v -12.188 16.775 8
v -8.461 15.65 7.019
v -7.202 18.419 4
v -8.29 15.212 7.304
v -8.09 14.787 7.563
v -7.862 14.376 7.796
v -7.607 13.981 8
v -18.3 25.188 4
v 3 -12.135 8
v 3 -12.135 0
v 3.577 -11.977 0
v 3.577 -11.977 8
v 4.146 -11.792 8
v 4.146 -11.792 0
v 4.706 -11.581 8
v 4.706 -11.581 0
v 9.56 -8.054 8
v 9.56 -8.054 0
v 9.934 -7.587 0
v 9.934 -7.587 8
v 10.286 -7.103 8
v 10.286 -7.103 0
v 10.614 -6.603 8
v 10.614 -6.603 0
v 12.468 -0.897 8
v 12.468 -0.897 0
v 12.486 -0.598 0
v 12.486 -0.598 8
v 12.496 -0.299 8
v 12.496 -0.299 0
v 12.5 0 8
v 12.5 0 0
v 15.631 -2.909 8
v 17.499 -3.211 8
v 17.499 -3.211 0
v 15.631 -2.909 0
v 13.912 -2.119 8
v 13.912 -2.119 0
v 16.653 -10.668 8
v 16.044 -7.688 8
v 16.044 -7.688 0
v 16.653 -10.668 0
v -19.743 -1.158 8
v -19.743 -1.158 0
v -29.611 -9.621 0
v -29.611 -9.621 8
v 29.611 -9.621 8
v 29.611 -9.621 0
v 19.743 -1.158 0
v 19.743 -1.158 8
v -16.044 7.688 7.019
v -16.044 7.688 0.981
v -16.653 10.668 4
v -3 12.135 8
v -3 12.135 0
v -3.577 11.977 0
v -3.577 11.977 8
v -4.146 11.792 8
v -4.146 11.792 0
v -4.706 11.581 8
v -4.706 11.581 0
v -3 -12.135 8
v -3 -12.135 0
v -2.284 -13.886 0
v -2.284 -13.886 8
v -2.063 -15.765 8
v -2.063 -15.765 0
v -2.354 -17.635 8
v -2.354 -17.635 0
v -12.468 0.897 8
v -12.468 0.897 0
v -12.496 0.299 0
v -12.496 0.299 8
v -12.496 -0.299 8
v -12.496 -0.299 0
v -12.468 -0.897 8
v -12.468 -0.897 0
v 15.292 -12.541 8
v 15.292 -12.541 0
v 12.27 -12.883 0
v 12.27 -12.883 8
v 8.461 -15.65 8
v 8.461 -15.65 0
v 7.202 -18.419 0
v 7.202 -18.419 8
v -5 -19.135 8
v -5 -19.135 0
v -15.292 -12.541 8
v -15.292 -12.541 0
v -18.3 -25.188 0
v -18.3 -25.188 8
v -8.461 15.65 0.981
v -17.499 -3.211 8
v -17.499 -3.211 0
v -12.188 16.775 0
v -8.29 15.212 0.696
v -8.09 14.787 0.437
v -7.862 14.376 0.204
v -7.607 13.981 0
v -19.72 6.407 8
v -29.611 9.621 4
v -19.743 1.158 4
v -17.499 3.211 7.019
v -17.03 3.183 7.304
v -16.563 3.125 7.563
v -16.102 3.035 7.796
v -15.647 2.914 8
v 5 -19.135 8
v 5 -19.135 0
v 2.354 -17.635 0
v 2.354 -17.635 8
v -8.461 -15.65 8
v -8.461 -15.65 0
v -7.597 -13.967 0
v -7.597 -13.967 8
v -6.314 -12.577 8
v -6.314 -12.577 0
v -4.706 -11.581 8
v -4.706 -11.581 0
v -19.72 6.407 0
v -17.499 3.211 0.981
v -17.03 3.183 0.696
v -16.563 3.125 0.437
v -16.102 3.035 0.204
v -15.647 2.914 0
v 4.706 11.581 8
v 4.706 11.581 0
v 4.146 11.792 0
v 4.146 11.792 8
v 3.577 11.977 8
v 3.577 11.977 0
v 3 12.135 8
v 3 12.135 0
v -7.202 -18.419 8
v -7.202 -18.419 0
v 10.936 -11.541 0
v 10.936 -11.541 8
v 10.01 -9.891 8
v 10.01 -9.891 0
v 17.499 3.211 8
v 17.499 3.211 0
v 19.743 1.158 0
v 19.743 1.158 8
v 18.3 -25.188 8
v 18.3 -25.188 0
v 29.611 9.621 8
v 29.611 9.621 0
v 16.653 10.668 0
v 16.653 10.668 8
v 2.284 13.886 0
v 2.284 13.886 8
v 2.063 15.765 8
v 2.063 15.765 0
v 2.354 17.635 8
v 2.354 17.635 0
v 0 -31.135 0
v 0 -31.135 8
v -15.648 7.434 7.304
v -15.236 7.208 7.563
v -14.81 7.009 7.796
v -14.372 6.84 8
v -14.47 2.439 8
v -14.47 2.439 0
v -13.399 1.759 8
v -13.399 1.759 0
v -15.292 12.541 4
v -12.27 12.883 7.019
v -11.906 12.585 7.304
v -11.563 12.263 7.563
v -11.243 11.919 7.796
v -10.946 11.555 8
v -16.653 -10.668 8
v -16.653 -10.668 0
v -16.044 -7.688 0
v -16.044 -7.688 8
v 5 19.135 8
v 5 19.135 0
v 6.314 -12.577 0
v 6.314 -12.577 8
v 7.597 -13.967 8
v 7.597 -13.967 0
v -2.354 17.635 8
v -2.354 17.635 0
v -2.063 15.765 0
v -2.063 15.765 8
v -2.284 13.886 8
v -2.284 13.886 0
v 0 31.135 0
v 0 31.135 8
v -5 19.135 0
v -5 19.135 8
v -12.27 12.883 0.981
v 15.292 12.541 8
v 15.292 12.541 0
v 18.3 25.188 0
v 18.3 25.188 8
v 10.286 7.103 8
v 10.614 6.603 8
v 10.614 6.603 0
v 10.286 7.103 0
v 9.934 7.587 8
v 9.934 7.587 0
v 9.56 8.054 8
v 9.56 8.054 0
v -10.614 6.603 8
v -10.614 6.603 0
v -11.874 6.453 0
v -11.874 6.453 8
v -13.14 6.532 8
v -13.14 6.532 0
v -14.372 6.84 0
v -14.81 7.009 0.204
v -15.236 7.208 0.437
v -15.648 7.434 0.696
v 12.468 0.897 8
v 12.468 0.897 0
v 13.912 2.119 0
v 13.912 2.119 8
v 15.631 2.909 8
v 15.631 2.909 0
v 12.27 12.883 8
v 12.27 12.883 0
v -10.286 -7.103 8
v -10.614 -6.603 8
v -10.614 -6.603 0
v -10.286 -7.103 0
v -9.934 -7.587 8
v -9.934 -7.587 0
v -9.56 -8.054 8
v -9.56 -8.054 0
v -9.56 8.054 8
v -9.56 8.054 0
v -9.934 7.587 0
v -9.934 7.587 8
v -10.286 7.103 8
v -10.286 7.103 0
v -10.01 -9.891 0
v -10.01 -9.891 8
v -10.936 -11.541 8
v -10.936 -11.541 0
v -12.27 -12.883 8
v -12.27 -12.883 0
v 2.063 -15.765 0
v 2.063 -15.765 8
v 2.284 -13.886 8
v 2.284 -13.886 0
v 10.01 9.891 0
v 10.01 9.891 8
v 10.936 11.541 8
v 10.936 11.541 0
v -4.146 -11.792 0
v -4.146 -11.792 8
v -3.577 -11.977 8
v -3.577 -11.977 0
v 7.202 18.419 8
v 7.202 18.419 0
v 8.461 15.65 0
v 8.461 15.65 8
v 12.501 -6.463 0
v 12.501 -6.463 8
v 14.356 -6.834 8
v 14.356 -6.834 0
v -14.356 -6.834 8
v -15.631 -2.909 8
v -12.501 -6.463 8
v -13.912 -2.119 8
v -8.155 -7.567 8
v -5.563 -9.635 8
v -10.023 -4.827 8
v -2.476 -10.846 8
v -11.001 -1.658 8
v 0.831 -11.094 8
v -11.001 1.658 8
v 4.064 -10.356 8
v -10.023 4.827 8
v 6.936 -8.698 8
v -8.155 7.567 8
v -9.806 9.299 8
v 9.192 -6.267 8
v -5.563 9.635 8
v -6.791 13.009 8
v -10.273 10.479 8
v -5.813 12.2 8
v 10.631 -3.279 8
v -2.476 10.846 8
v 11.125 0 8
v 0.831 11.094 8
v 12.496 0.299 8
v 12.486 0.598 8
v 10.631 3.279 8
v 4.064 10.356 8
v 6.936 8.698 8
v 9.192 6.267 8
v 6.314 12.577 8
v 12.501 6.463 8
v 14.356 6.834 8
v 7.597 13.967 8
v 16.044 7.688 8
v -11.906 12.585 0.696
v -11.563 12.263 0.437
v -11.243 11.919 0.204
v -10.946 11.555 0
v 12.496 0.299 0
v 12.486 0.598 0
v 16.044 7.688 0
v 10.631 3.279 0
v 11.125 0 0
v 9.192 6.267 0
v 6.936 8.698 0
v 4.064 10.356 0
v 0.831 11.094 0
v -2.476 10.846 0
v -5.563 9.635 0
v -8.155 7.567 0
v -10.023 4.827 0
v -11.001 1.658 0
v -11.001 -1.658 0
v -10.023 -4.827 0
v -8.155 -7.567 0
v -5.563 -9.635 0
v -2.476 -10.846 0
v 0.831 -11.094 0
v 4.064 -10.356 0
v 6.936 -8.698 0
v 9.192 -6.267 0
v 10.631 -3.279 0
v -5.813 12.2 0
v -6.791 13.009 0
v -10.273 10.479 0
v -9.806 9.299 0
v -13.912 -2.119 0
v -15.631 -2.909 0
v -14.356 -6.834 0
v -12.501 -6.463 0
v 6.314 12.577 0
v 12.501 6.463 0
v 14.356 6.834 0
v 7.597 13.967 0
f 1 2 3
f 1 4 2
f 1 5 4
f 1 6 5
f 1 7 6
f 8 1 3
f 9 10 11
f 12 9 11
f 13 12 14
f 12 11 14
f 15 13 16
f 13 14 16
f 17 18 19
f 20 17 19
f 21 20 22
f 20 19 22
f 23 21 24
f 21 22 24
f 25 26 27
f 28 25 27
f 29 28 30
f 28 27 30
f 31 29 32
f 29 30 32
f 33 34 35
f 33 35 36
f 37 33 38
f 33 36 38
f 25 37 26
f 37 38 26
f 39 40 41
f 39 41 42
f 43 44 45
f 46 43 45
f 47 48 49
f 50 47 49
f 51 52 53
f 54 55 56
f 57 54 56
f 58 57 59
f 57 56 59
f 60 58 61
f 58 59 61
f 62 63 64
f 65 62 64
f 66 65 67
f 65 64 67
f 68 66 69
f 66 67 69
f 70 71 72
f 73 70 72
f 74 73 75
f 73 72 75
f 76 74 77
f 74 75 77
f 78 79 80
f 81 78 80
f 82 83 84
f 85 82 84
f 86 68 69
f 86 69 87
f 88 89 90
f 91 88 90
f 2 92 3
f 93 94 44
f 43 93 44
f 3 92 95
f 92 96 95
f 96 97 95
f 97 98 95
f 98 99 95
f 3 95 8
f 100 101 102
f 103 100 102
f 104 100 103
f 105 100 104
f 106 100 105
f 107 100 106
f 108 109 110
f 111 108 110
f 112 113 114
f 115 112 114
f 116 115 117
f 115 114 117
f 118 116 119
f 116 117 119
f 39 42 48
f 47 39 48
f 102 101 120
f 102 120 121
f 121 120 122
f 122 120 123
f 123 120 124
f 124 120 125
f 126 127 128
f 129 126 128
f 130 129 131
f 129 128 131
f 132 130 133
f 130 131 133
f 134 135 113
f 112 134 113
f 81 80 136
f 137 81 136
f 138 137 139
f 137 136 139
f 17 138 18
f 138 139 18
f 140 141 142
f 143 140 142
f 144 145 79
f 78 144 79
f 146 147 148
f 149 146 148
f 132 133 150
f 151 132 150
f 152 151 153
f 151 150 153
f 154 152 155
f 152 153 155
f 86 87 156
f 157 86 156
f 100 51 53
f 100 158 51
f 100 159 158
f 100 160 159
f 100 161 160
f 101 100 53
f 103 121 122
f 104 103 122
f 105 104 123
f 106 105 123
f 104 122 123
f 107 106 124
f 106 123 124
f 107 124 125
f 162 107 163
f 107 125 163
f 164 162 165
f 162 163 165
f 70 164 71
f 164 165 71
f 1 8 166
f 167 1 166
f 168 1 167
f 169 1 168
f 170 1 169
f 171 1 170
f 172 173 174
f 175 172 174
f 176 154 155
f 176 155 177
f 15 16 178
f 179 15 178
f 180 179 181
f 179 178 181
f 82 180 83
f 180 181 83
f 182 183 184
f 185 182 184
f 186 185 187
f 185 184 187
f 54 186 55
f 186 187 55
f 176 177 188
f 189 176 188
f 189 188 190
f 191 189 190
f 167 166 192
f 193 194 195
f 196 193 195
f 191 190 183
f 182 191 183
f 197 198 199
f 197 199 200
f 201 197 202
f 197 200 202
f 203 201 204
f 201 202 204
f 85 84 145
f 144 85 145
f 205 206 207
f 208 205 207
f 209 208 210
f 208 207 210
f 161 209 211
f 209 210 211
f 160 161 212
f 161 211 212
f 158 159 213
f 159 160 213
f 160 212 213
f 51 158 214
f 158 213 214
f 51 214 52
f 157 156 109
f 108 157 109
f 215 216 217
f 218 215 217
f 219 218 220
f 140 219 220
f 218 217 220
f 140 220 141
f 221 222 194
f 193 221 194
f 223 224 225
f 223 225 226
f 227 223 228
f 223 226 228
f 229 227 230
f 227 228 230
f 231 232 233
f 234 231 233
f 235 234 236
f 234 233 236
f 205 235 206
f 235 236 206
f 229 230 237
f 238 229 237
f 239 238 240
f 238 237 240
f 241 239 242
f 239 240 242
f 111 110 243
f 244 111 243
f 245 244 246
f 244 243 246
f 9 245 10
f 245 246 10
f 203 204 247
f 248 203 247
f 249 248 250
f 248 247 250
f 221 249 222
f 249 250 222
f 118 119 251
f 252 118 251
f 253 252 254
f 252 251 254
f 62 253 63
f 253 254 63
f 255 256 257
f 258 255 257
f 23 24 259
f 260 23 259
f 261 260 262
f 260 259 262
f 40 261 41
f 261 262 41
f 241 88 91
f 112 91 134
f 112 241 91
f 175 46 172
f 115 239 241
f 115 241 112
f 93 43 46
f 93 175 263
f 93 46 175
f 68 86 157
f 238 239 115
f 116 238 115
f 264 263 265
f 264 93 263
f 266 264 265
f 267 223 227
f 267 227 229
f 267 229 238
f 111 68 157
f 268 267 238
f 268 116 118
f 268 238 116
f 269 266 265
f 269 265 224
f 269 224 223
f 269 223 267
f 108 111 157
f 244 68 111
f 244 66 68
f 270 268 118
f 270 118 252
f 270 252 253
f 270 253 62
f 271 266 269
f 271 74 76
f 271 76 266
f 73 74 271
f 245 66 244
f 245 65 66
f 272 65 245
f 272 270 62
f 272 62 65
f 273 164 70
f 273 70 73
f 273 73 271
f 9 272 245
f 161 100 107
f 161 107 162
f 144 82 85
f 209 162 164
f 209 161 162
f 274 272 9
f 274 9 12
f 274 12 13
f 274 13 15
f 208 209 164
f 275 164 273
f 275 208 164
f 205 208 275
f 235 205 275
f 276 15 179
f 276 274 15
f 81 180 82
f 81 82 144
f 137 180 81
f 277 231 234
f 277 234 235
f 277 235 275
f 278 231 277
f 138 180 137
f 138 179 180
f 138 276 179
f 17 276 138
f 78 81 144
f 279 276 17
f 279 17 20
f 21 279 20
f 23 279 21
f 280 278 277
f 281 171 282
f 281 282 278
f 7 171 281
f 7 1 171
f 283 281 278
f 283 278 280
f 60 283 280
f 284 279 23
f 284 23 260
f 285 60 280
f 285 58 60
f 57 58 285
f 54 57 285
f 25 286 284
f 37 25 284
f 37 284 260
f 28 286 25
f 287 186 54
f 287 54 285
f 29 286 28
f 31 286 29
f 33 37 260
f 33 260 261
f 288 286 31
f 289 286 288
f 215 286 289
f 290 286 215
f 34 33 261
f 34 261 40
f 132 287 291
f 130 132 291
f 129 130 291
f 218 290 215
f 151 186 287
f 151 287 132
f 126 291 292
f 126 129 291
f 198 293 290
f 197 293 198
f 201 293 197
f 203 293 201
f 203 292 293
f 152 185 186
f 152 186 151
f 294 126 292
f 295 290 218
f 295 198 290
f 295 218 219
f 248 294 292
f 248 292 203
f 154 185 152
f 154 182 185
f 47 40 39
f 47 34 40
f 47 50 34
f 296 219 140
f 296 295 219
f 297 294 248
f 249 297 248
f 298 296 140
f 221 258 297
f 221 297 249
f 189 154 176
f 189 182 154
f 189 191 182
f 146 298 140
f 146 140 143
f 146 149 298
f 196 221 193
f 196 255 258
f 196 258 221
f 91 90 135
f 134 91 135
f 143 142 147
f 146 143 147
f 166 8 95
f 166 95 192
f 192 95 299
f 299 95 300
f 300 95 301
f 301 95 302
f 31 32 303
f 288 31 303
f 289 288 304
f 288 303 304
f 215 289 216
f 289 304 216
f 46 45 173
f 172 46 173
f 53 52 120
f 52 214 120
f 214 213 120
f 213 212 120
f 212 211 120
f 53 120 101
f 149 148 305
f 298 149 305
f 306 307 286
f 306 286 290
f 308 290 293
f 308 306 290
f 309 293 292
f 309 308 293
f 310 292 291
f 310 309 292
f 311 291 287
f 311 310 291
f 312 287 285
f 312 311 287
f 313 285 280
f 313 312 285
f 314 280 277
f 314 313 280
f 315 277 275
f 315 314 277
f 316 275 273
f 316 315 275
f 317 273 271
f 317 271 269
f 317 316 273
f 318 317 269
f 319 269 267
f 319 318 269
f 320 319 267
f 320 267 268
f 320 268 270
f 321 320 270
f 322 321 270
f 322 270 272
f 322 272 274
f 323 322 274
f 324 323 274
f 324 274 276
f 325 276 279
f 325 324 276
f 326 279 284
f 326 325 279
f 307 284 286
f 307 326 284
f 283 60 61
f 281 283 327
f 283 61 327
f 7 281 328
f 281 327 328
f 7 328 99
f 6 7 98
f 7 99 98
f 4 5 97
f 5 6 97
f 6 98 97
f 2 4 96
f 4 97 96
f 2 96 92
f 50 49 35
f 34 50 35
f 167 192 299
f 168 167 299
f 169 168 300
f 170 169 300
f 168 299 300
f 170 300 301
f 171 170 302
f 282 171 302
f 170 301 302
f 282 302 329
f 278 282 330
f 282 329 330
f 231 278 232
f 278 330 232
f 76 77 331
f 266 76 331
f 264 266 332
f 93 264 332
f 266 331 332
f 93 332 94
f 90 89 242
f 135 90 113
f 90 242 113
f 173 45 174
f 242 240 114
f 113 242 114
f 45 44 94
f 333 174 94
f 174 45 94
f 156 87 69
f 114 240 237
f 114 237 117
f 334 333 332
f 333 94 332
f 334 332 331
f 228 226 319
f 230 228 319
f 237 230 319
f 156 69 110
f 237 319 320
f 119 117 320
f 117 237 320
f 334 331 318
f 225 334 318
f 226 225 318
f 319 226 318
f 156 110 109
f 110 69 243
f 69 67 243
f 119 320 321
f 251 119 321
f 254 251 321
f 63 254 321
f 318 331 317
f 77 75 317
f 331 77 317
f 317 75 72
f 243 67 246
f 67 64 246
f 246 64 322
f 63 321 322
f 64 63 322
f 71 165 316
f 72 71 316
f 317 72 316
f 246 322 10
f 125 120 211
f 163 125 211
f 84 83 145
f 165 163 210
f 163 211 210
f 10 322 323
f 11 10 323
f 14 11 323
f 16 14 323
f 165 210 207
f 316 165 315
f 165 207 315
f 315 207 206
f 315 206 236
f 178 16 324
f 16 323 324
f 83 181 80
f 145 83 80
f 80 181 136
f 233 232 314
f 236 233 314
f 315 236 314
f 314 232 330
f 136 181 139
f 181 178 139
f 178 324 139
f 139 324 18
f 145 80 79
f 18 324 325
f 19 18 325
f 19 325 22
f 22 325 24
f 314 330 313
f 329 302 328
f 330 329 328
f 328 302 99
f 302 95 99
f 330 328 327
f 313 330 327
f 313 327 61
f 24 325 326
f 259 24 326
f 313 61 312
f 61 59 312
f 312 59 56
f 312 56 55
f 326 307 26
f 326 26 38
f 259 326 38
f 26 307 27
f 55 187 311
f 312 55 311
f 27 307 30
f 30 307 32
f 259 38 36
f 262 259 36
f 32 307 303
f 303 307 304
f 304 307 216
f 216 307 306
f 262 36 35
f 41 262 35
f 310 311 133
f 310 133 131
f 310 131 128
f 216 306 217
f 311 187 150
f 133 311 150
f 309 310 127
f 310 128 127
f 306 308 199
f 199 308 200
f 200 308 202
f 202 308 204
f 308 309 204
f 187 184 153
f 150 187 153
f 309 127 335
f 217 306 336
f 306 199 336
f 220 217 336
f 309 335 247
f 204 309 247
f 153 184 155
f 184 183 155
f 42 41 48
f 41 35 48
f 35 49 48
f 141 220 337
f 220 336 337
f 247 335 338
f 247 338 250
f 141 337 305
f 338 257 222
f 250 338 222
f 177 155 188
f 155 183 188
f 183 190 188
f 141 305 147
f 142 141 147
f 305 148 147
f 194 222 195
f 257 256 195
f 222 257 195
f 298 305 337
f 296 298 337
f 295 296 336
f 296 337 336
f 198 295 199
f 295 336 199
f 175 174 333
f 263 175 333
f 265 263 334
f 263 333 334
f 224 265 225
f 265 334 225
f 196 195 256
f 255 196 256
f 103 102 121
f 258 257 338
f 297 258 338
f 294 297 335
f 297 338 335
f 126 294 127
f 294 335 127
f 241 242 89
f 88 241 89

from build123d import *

# Parameters (mm, degrees)
F0_R     = 11.125
F1_DEPTH = 8
F2_SIZE  = 3.99999


# Not quite as in the source:
# - a fillet or chamfer is up to 0.001 mm smaller than in the source, because OpenCascade refuses the exact size


with BuildPart() as f1:
    # F0 (on Top) → F1 (new body)
    with BuildSketch(Plane.XY):
        with BuildLine():
            ThreePointArc((12.4677994948, -0.8966469518), (12.4919472799, -0.44861248), (12.5, 0))
            ThreePointArc((12.5, 0), (12.4919472799, 0.44861248), (12.4677994948, 0.8966469518))
            ThreePointArc((12.4677994948, 0.8966469518), (11.8882064537, 3.8627124297), (10.6136975286, 6.6029860496))
            ThreePointArc((10.6136975286, 6.6029860496), (10.1127124297, 7.3473156537), (9.559625819, 8.0537912936))
            ThreePointArc((9.559625819, 8.0537912936), (7.3473156537, 10.1127124297), (4.7055238527, 11.5805028074))
            ThreePointArc((4.7055238527, 11.5805028074), (3.8627124297, 11.8882064537), (3, 12.1346610995))
            ThreePointArc((3, 12.1346610995), (0, 12.5), (-3, 12.1346610995))
            ThreePointArc((-3, 12.1346610995), (-3.8627124297, 11.8882064537), (-4.7055238527, 11.5805028074))
            ThreePointArc((-4.7055238527, 11.5805028074), (-7.3473156537, 10.1127124297), (-9.559625819, 8.0537912936))
            ThreePointArc((-9.559625819, 8.0537912936), (-10.1127124297, 7.3473156537), (-10.6136975286, 6.6029860496))
            ThreePointArc((-10.6136975286, 6.6029860496), (-11.8882064537, 3.8627124297), (-12.4677994948, 0.8966469518))
            ThreePointArc((-12.4677994948, 0.8966469518), (-12.5, 0), (-12.4677994948, -0.8966469518))
            ThreePointArc((-12.4677994948, -0.8966469518), (-11.8882064537, -3.8627124297), (-10.6136975286, -6.6029860496))
            ThreePointArc((-10.6136975286, -6.6029860496), (-10.1127124297, -7.3473156537), (-9.559625819, -8.0537912936))
            ThreePointArc((-9.559625819, -8.0537912936), (-7.3473156537, -10.1127124297), (-4.7055238527, -11.5805028074))
            ThreePointArc((-4.7055238527, -11.5805028074), (-3.8627124297, -11.8882064537), (-3, -12.1346610995))
            ThreePointArc((-3, -12.1346610995), (0, -12.5), (3, -12.1346610995))
            ThreePointArc((3, -12.1346610995), (3.8627124297, -11.8882064537), (4.7055238527, -11.5805028074))
            ThreePointArc((4.7055238527, -11.5805028074), (7.3473156537, -10.1127124297), (9.559625819, -8.0537912936))
            ThreePointArc((9.559625819, -8.0537912936), (10.1127124297, -7.3473156537), (10.6136975286, -6.6029860496))
            ThreePointArc((10.6136975286, -6.6029860496), (11.8882064537, -3.8627124297), (12.4677994948, -0.8966469518))
        make_face()
        Circle(F0_R, mode=Mode.SUBTRACT)
        with BuildLine():
            ThreePointArc((10.6136975286, 6.6029860496), (11.8882064537, 3.8627124297), (12.4677994948, 0.8966469518))
            ThreePointArc((12.4677994948, 0.8966469518), (14.7448297559, 2.5723295046), (17.4989772889, 3.2106477587))
            ThreePointArc((17.4989772889, 3.2106477587), (18.3165016402, 3.1827968502), (19.1251951089, 3.0597659125))
            Line((19.1251951089, 3.0597659125), (17.2710931427, 8.7661050102))
            ThreePointArc((17.2710931427, 8.7661050102), (16.689162154, 8.1912327962), (16.0441414138, 7.6881721809))
            ThreePointArc((16.0441414138, 7.6881721809), (13.4407951985, 6.5857351937), (10.6136975286, 6.6029860496))
        make_face()
        with BuildLine():
            ThreePointArc((17.4989772889, -3.2106477587), (14.7448297559, -2.5723295046), (12.4677994948, -0.8966469518))
            ThreePointArc((12.4677994948, -0.8966469518), (11.8882064537, -3.8627124297), (10.6136975286, -6.6029860496))
            ThreePointArc((10.6136975286, -6.6029860496), (13.4407951985, -6.5857351937), (16.0441414138, -7.6881721809))
            ThreePointArc((16.0441414138, -7.6881721809), (16.689162154, -8.1912327962), (17.2710931427, -8.7661050102))
            Line((17.2710931427, -8.7661050102), (19.1251951089, -3.0597659125))
            ThreePointArc((19.1251951089, -3.0597659125), (18.3165016402, -3.1827968502), (17.4989772889, -3.2106477587))
        make_face()
        with BuildLine():
            ThreePointArc((19.1251951089, 3.0597659125), (18.3165016402, 3.1827968502), (17.4989772889, 3.2106477587))
            Line((17.4989772889, 3.2106477587), (19.7432290977, 1.1576528799))
            Line((19.7432290977, 1.1576528799), (19.1251951089, 3.0597659125))
        make_face()
        with BuildLine():
            Line((19.7432290977, -1.1576528799), (17.4989772889, -3.2106477587))
            ThreePointArc((17.4989772889, -3.2106477587), (18.3165016402, -3.1827968502), (19.1251951089, -3.0597659125))
            Line((19.1251951089, -3.0597659125), (19.7432290977, -1.1576528799))
        make_face()
        with BuildLine():
            ThreePointArc((4.7055238527, 11.5805028074), (7.3473156537, 10.1127124297), (9.559625819, 8.0537912936))
            ThreePointArc((9.559625819, 8.0537912936), (10.4168405049, 10.7478517624), (12.269798608, 12.8831093804))
            ThreePointArc((12.269798608, 12.8831093804), (12.9475600548, 13.3411062792), (13.674122585, 13.7169102542))
            Line((13.674122585, 13.7169102542), (8.8200206188, 17.243621768))
            ThreePointArc((8.8200206188, 17.243621768), (8.6871299688, 16.4364899243), (8.4609888389, 15.6503716587))
            ThreePointArc((8.4609888389, 15.6503716587), (7.0028337111, 13.228272889), (4.7055238527, 11.5805028074))
        make_face()
        with BuildLine():
            Line((16.6530591539, 10.6682180428), (16.0441414138, 7.6881721809))
            ThreePointArc((16.0441414138, 7.6881721809), (16.689162154, 8.1912327962), (17.2710931427, 8.7661050102))
            Line((17.2710931427, 8.7661050102), (16.6530591539, 10.6682180428))
        make_face()
        Polygon((17.2710931427, 8.7661050102), (19.1251951089, 3.0597659125), (19.7432290977, 1.1576528799), (29.6108223213, 9.6211393939), (16.6530591539, 10.6682180428), align=None)
        with BuildLine():
            ThreePointArc((12.269798608, -12.8831093804), (10.4168405049, -10.7478517624), (9.559625819, -8.0537912936))
            ThreePointArc((9.559625819, -8.0537912936), (7.3473156537, -10.1127124297), (4.7055238527, -11.5805028074))
            ThreePointArc((4.7055238527, -11.5805028074), (7.0028337111, -13.228272889), (8.4609888389, -15.6503716587))
            ThreePointArc((8.4609888389, -15.6503716587), (8.6871299688, -16.4364899243), (8.8200206188, -17.243621768))
            Line((8.8200206188, -17.243621768), (13.674122585, -13.7169102542))
            ThreePointArc((13.674122585, -13.7169102542), (12.9475600548, -13.3411062792), (12.269798608, -12.8831093804))
        make_face()
        with BuildLine():
            ThreePointArc((17.2710931427, -8.7661050102), (16.689162154, -8.1912327962), (16.0441414138, -7.6881721809))
            Line((16.0441414138, -7.6881721809), (16.6530591539, -10.6682180428))
            Line((16.6530591539, -10.6682180428), (17.2710931427, -8.7661050102))
        make_face()
        Polygon((19.7432290977, -1.1576528799), (19.1251951089, -3.0597659125), (17.2710931427, -8.7661050102), (16.6530591539, -10.6682180428), (29.6108223213, -9.6211393939), align=None)
        with BuildLine():
            ThreePointArc((13.674122585, 13.7169102542), (12.9475600548, 13.3411062792), (12.269798608, 12.8831093804))
            Line((12.269798608, 12.8831093804), (15.2921565738, 12.5413397496))
            Line((15.2921565738, 12.5413397496), (13.674122585, 13.7169102542))
        make_face()
        with BuildLine():
            Line((15.2921565738, -12.5413397496), (12.269798608, -12.8831093804))
            ThreePointArc((12.269798608, -12.8831093804), (12.9475600548, -13.3411062792), (13.674122585, -13.7169102542))
            Line((13.674122585, -13.7169102542), (15.2921565738, -12.5413397496))
        make_face()
        with BuildLine():
            ThreePointArc((-3, 12.1346610995), (0, 12.5), (3, 12.1346610995))
            ThreePointArc((3, 12.1346610995), (2.1099722363, 14.818059953), (2.353973894, 17.6346610995))
            ThreePointArc((2.353973894, 17.6346610995), (2.6330905999, 18.403566557), (3, 19.1346610995))
            Line((3, 19.1346610995), (-3, 19.1346610995))
            ThreePointArc((-3, 19.1346610995), (-2.6330905999, 18.403566557), (-2.353973894, 17.6346610995))
            ThreePointArc((-2.353973894, 17.6346610995), (-2.1099722363, 14.818059953), (-3, 12.1346610995))
        make_face()
        with BuildLine():
            Line((7.20198663, 18.4191922726), (8.4609888389, 15.6503716587))
            ThreePointArc((8.4609888389, 15.6503716587), (8.6871299688, 16.4364899243), (8.8200206188, 17.243621768))
            Line((8.8200206188, 17.243621768), (7.20198663, 18.4191922726))
        make_face()
        Polygon((8.8200206188, 17.243621768), (13.674122585, 13.7169102542), (15.2921565738, 12.5413397496), (18.3004946294, 25.1884699436), (7.20198663, 18.4191922726), align=None)
        with BuildLine():
            ThreePointArc((2.353973894, -17.6346610995), (2.1099722363, -14.818059953), (3, -12.1346610995))
            ThreePointArc((3, -12.1346610995), (0, -12.5), (-3, -12.1346610995))
            ThreePointArc((-3, -12.1346610995), (-2.1099722363, -14.818059953), (-2.353973894, -17.6346610995))
            ThreePointArc((-2.353973894, -17.6346610995), (-2.6330905999, -18.403566557), (-3, -19.1346610995))
            Line((-3, -19.1346610995), (3, -19.1346610995))
            ThreePointArc((3, -19.1346610995), (2.6330905999, -18.403566557), (2.353973894, -17.6346610995))
        make_face()
        with BuildLine():
            ThreePointArc((8.8200206188, -17.243621768), (8.6871299688, -16.4364899243), (8.4609888389, -15.6503716587))
            Line((8.4609888389, -15.6503716587), (7.20198663, -18.4191922726))
            Line((7.20198663, -18.4191922726), (8.8200206188, -17.243621768))
        make_face()
        Polygon((15.2921565738, -12.5413397496), (13.674122585, -13.7169102542), (8.8200206188, -17.243621768), (7.20198663, -18.4191922726), (18.3004946294, -25.1884699436), align=None)
        with BuildLine():
            ThreePointArc((3, 19.1346610995), (2.6330905999, 18.403566557), (2.353973894, 17.6346610995))
            Line((2.353973894, 17.6346610995), (5, 19.1346610995))
            Line((5, 19.1346610995), (3, 19.1346610995))
        make_face()
        with BuildLine():
            Line((5, -19.1346610995), (2.353973894, -17.6346610995))
            ThreePointArc((2.353973894, -17.6346610995), (2.6330905999, -18.403566557), (3, -19.1346610995))
            Line((3, -19.1346610995), (5, -19.1346610995))
        make_face()
        with BuildLine():
            ThreePointArc((-9.559625819, 8.0537912936), (-7.3473156537, 10.1127124297), (-4.7055238527, 11.5805028074))
            ThreePointArc((-4.7055238527, 11.5805028074), (-7.0028337111, 13.228272889), (-8.4609888389, 15.6503716587))
            ThreePointArc((-8.4609888389, 15.6503716587), (-8.6871299688, 16.4364899243), (-8.8200206188, 17.243621768))
            Line((-8.8200206188, 17.243621768), (-13.674122585, 13.7169102542))
            ThreePointArc((-13.674122585, 13.7169102542), (-12.9475600548, 13.3411062792), (-12.269798608, 12.8831093804))
            ThreePointArc((-12.269798608, 12.8831093804), (-10.4168405049, 10.7478517624), (-9.559625819, 8.0537912936))
        make_face()
        with BuildLine():
            Line((-5, 19.1346610995), (-2.353973894, 17.6346610995))
            ThreePointArc((-2.353973894, 17.6346610995), (-2.6330905999, 18.403566557), (-3, 19.1346610995))
            Line((-3, 19.1346610995), (-5, 19.1346610995))
        make_face()
        Polygon((-3, 19.1346610995), (3, 19.1346610995), (5, 19.1346610995), (0, 31.1346610995), (-5, 19.1346610995), align=None)
        with BuildLine():
            ThreePointArc((-8.4609888389, -15.6503716587), (-7.0028337111, -13.228272889), (-4.7055238527, -11.5805028074))
            ThreePointArc((-4.7055238527, -11.5805028074), (-7.3473156537, -10.1127124297), (-9.559625819, -8.0537912936))
            ThreePointArc((-9.559625819, -8.0537912936), (-10.4168405049, -10.7478517624), (-12.269798608, -12.8831093804))
            ThreePointArc((-12.269798608, -12.8831093804), (-12.9475600548, -13.3411062792), (-13.674122585, -13.7169102542))
            Line((-13.674122585, -13.7169102542), (-8.8200206188, -17.243621768))
            ThreePointArc((-8.8200206188, -17.243621768), (-8.6871299688, -16.4364899243), (-8.4609888389, -15.6503716587))
        make_face()
        with BuildLine():
            ThreePointArc((-3, -19.1346610995), (-2.6330905999, -18.403566557), (-2.353973894, -17.6346610995))
            Line((-2.353973894, -17.6346610995), (-5, -19.1346610995))
            Line((-5, -19.1346610995), (-3, -19.1346610995))
        make_face()
        Polygon((5, -19.1346610995), (3, -19.1346610995), (-3, -19.1346610995), (-5, -19.1346610995), (0, -31.1346610995), align=None)
        with BuildLine():
            ThreePointArc((-8.8200206188, 17.243621768), (-8.6871299688, 16.4364899243), (-8.4609888389, 15.6503716587))
            Line((-8.4609888389, 15.6503716587), (-7.20198663, 18.4191922726))
            Line((-7.20198663, 18.4191922726), (-8.8200206188, 17.243621768))
        make_face()
        with BuildLine():
            Line((-7.20198663, -18.4191922726), (-8.4609888389, -15.6503716587))
            ThreePointArc((-8.4609888389, -15.6503716587), (-8.6871299688, -16.4364899243), (-8.8200206188, -17.243621768))
            Line((-8.8200206188, -17.243621768), (-7.20198663, -18.4191922726))
        make_face()
        with BuildLine():
            ThreePointArc((-12.4677994948, 0.8966469518), (-11.8882064537, 3.8627124297), (-10.6136975286, 6.6029860496))
            ThreePointArc((-10.6136975286, 6.6029860496), (-13.4407951985, 6.5857351937), (-16.0441414138, 7.6881721809))
            ThreePointArc((-16.0441414138, 7.6881721809), (-16.689162154, 8.1912327962), (-17.2710931427, 8.7661050102))
            Line((-17.2710931427, 8.7661050102), (-19.1251951089, 3.0597659125))
            ThreePointArc((-19.1251951089, 3.0597659125), (-18.3165016402, 3.1827968502), (-17.4989772889, 3.2106477587))
            ThreePointArc((-17.4989772889, 3.2106477587), (-14.7448297559, 2.5723295046), (-12.4677994948, 0.8966469518))
        make_face()
        with BuildLine():
            Line((-15.2921565738, 12.5413397496), (-12.269798608, 12.8831093804))
            ThreePointArc((-12.269798608, 12.8831093804), (-12.9475600548, 13.3411062792), (-13.674122585, 13.7169102542))
            Line((-13.674122585, 13.7169102542), (-15.2921565738, 12.5413397496))
        make_face()
        Polygon((-13.674122585, 13.7169102542), (-8.8200206188, 17.243621768), (-7.20198663, 18.4191922726), (-18.3004946294, 25.1884699436), (-15.2921565738, 12.5413397496), align=None)
        with BuildLine():
            ThreePointArc((-16.0441414138, -7.6881721809), (-13.4407951985, -6.5857351937), (-10.6136975286, -6.6029860496))
            ThreePointArc((-10.6136975286, -6.6029860496), (-11.8882064537, -3.8627124297), (-12.4677994948, -0.8966469518))
            ThreePointArc((-12.4677994948, -0.8966469518), (-14.7448297559, -2.5723295046), (-17.4989772889, -3.2106477587))
            ThreePointArc((-17.4989772889, -3.2106477587), (-18.3165016402, -3.1827968502), (-19.1251951089, -3.0597659125))
            Line((-19.1251951089, -3.0597659125), (-17.2710931427, -8.7661050102))
            ThreePointArc((-17.2710931427, -8.7661050102), (-16.689162154, -8.1912327962), (-16.0441414138, -7.6881721809))
        make_face()
        with BuildLine():
            ThreePointArc((-13.674122585, -13.7169102542), (-12.9475600548, -13.3411062792), (-12.269798608, -12.8831093804))
            Line((-12.269798608, -12.8831093804), (-15.2921565738, -12.5413397496))
            Line((-15.2921565738, -12.5413397496), (-13.674122585, -13.7169102542))
        make_face()
        Polygon((-7.20198663, -18.4191922726), (-8.8200206188, -17.243621768), (-13.674122585, -13.7169102542), (-15.2921565738, -12.5413397496), (-18.3004946294, -25.1884699436), align=None)
        with BuildLine():
            ThreePointArc((-17.2710931427, 8.7661050102), (-16.689162154, 8.1912327962), (-16.0441414138, 7.6881721809))
            Line((-16.0441414138, 7.6881721809), (-16.6530591539, 10.6682180428))
            Line((-16.6530591539, 10.6682180428), (-17.2710931427, 8.7661050102))
        make_face()
        with BuildLine():
            Line((-16.6530591539, -10.6682180428), (-16.0441414138, -7.6881721809))
            ThreePointArc((-16.0441414138, -7.6881721809), (-16.689162154, -8.1912327962), (-17.2710931427, -8.7661050102))
            Line((-17.2710931427, -8.7661050102), (-16.6530591539, -10.6682180428))
        make_face()
        with BuildLine():
            Line((-19.7432290977, 1.1576528799), (-17.4989772889, 3.2106477587))
            ThreePointArc((-17.4989772889, 3.2106477587), (-18.3165016402, 3.1827968502), (-19.1251951089, 3.0597659125))
            Line((-19.1251951089, 3.0597659125), (-19.7432290977, 1.1576528799))
        make_face()
        Polygon((-19.1251951089, 3.0597659125), (-17.2710931427, 8.7661050102), (-16.6530591539, 10.6682180428), (-29.6108223213, 9.6211393939), (-19.7432290977, 1.1576528799), align=None)
        with BuildLine():
            ThreePointArc((-19.1251951089, -3.0597659125), (-18.3165016402, -3.1827968502), (-17.4989772889, -3.2106477587))
            Line((-17.4989772889, -3.2106477587), (-19.7432290977, -1.1576528799))
            Line((-19.7432290977, -1.1576528799), (-19.1251951089, -3.0597659125))
        make_face()
        Polygon((-16.6530591539, -10.6682180428), (-17.2710931427, -8.7661050102), (-19.1251951089, -3.0597659125), (-19.7432290977, -1.1576528799), (-29.6108223213, -9.6211393939), align=None)
    extrude(amount=F1_DEPTH)

    # F2 (size 4 in the source; OpenCascade refuses exactly that, so slightly less here)
    f2_edges = [f1.edges().sort_by_distance(p)[0] for p in [
        (-16.796326, 18.864905, 8),
        (-12.751241, 21.803831, 8),
        (-12.751241, 21.803831, 0),
        (-16.796326, 18.864905, 0),
        (-23.131941, 10.144679, 8),
        (-24.677026, 5.389396, 8),
        (-24.677026, 5.389396, 0),
        (-23.131941, 10.144679, 0),
    ]]
    chamfer(f2_edges, length=F2_SIZE)


solid = f1.part
